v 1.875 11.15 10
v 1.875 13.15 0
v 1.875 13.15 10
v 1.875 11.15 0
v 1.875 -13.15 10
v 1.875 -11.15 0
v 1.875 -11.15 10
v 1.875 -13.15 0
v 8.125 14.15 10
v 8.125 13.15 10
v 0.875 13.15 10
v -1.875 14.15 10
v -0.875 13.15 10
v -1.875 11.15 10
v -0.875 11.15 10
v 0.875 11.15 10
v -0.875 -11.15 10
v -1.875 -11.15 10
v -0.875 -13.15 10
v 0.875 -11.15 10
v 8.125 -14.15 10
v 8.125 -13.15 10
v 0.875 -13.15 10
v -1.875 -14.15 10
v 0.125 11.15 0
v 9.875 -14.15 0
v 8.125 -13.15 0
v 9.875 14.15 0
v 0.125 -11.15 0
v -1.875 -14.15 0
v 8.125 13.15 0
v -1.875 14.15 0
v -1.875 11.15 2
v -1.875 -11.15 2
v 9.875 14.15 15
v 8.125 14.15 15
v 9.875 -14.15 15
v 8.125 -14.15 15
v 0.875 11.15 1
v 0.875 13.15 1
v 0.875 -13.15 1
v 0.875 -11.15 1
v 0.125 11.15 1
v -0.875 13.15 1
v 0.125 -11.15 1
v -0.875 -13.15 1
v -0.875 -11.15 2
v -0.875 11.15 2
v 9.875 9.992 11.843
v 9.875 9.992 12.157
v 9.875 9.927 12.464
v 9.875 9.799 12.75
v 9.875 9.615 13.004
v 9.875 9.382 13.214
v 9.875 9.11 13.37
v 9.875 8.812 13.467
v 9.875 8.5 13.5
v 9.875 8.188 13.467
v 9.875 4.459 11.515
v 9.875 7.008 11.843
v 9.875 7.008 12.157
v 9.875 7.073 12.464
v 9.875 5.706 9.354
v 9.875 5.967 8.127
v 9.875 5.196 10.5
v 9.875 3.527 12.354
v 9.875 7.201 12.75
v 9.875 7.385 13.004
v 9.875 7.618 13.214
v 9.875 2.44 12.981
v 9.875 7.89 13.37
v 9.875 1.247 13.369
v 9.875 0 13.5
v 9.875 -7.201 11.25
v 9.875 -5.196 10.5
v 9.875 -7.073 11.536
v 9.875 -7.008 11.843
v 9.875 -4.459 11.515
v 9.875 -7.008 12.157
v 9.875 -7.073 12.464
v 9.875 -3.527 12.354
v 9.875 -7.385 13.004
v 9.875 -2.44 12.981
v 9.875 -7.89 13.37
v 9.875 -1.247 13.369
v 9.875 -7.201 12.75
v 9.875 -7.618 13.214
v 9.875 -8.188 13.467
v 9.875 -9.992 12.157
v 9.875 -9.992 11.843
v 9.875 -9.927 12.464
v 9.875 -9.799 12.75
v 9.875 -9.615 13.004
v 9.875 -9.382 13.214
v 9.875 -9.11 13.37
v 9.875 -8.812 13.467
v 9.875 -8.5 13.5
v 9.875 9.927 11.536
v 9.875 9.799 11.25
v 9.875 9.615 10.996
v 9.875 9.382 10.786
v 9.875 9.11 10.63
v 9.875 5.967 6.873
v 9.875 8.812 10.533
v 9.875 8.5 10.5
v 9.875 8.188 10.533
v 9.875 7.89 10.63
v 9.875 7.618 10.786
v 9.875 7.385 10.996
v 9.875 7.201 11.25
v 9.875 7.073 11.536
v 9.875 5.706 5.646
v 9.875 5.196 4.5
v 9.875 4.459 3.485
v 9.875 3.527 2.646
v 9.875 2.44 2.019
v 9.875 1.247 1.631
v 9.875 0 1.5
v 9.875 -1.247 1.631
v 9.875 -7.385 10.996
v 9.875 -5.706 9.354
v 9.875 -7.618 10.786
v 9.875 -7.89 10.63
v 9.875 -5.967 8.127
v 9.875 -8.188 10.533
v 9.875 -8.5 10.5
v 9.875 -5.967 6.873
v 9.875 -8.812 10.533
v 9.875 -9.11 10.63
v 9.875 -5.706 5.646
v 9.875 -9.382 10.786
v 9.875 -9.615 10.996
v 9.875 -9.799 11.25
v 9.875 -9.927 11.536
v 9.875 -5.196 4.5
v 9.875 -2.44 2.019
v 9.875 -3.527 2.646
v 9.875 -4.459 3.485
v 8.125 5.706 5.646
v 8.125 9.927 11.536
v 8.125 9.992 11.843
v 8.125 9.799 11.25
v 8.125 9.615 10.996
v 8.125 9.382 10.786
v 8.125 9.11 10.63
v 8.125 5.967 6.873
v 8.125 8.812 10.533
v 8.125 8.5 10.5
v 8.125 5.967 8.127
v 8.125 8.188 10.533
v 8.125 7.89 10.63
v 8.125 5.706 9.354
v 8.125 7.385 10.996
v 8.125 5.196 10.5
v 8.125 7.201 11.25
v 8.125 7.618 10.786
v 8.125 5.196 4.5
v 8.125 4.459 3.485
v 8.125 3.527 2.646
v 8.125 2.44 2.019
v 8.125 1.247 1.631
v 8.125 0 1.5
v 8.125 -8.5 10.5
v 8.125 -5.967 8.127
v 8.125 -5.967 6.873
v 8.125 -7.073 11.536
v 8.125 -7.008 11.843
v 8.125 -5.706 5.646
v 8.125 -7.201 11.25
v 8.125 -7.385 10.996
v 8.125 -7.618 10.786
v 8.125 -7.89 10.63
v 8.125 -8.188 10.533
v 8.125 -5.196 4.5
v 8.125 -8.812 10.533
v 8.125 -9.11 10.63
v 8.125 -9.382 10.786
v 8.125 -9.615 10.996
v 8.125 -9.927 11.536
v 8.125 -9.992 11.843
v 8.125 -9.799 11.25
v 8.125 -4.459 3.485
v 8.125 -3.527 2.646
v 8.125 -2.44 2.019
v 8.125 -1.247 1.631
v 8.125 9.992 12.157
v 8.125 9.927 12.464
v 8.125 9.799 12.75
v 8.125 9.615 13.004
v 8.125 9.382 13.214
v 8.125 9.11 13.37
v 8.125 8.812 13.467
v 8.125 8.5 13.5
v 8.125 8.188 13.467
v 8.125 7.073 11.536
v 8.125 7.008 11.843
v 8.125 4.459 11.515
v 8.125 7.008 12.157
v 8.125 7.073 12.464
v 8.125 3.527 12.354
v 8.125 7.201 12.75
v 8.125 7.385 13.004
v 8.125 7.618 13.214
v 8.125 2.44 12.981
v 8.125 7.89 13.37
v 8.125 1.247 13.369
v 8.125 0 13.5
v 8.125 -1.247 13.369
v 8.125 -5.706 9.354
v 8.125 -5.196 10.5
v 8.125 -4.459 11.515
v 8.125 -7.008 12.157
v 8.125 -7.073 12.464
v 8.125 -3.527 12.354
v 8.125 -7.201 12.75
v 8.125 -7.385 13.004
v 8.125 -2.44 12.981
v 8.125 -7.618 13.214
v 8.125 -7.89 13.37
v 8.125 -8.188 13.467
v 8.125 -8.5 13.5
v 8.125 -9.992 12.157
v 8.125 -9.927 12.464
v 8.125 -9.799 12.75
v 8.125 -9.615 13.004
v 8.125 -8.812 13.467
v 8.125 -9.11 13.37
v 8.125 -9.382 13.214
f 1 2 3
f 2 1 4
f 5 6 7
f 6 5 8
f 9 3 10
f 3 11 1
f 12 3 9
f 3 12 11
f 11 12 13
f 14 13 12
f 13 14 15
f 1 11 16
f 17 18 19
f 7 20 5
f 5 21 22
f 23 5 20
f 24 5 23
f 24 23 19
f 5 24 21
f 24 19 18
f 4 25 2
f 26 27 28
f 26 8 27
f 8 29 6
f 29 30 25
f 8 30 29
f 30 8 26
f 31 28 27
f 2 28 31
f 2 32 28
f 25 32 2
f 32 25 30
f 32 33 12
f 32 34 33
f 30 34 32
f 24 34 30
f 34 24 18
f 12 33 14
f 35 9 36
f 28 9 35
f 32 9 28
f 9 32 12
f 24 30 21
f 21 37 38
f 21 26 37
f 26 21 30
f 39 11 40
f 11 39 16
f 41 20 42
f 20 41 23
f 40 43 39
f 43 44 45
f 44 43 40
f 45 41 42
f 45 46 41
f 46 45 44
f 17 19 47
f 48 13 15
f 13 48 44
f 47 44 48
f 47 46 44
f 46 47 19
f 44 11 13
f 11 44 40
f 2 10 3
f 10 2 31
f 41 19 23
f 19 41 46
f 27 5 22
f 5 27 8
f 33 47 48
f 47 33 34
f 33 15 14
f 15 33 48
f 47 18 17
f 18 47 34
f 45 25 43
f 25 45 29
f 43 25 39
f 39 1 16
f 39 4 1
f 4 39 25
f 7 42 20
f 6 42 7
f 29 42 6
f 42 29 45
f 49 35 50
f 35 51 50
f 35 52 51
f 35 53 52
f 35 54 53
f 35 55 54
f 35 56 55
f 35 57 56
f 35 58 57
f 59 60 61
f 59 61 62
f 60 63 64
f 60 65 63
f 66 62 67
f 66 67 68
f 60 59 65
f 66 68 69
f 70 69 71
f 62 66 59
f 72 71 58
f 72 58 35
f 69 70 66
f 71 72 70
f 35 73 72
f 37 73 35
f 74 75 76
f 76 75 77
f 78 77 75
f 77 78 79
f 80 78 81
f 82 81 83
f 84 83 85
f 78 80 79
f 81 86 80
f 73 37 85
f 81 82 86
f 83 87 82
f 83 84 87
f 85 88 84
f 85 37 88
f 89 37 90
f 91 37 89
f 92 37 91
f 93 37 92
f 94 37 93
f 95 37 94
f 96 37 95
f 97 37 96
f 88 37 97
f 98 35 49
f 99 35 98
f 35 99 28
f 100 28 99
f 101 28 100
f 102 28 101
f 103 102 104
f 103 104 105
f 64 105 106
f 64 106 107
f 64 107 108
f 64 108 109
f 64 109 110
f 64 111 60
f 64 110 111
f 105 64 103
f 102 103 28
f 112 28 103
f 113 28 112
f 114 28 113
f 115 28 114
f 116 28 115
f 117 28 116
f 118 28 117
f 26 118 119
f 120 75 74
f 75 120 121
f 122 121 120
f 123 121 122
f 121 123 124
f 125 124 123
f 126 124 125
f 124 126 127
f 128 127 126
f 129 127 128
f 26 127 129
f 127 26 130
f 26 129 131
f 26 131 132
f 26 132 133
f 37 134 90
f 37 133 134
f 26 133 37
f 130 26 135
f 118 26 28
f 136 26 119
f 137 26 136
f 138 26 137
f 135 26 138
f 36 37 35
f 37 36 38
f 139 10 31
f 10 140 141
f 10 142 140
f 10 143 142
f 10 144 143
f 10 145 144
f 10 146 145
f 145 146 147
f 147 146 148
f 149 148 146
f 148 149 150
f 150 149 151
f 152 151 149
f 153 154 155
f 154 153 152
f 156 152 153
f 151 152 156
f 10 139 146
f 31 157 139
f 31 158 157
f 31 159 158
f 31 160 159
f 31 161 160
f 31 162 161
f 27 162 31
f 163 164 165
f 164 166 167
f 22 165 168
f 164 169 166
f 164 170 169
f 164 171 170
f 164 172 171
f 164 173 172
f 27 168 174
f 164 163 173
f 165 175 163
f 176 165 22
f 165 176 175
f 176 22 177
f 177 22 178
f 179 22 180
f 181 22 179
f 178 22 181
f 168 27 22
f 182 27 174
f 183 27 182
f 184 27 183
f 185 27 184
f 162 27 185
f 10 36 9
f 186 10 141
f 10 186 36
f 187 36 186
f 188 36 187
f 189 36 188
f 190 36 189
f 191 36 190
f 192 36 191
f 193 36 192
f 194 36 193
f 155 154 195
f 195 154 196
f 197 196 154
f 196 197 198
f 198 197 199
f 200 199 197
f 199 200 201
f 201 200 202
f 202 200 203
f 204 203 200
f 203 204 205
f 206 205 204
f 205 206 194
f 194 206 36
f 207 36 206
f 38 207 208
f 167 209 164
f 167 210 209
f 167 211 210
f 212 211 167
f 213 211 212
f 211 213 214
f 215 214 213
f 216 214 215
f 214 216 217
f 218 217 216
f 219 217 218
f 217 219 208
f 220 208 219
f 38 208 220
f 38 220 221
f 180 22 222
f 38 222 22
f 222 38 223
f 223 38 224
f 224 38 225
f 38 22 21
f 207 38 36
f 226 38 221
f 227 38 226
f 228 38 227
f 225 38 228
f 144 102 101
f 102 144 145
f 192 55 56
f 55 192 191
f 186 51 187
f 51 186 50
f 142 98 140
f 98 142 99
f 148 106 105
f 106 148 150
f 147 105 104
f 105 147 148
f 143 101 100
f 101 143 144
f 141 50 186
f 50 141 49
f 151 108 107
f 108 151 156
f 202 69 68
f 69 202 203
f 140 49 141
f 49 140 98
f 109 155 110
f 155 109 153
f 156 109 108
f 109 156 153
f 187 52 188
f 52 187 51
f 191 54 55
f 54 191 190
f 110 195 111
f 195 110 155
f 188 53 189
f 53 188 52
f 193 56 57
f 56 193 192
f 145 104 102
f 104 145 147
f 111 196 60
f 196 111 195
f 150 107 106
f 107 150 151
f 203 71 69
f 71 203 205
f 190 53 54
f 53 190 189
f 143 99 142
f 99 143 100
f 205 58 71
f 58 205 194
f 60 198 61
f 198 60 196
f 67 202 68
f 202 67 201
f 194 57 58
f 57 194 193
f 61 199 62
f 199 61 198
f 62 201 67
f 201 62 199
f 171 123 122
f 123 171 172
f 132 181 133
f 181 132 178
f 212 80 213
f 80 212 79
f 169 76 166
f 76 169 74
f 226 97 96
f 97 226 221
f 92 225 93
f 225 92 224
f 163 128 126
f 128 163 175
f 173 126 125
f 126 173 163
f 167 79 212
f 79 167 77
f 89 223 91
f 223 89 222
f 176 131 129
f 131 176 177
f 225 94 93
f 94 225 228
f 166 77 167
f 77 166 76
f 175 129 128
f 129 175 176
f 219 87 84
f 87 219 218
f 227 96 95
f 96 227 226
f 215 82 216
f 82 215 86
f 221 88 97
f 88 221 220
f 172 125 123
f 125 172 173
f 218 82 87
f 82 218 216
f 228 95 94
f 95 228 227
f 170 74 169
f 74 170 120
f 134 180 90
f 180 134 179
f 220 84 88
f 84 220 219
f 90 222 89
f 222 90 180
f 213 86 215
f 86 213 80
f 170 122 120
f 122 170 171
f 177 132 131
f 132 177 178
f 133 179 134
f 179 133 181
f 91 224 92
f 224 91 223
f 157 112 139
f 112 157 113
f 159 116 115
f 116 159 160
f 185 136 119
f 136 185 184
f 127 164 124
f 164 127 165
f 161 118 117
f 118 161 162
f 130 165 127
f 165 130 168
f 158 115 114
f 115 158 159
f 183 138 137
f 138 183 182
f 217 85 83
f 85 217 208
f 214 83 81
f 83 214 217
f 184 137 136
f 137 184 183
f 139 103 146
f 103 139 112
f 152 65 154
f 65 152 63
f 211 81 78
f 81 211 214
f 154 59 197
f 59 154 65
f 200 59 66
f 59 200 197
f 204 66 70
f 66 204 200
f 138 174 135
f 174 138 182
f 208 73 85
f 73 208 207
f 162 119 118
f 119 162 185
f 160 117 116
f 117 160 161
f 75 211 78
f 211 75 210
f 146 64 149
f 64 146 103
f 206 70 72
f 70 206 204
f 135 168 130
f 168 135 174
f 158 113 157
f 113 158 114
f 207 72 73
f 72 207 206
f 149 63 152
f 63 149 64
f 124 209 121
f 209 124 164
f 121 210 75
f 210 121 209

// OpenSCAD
//prefixes:
//d_ distance
//r_ radius
//h_ height
//w_ width
//l_ length
//m_ margin
//o_ offset

/*

module screw_hole(d_screwhole,r_screwhole,m_screwhole,h_plate,w_plate,l_plate,length,q){

    r_screwhole_perim = r_screwhole+m_screwhole;

    difference(){
    
   union(){       
                 translate([0,0,h_plate/2])
      cube([d_screwhole*2,r_screwhole_perim*2,h_plate],center=true);

        translate([-d_screwhole,0,0]){   
          difference(){
            cylinder(r=r_screwhole_perim,h_plate);
         //   cylinder(r=r_screwhole,h_plate);
          }
        }   
        
        translate([d_screwhole,0,0]){   
          difference(){
            cylinder(r=r_screwhole_perim,h_plate);
         //   cylinder(r=r_screwhole,h_plate);
          }
        }   
   }
   
           translate([-d_screwhole,0,0]){   
          difference(){
         //   cylinder(r=r_screwhole_perim,h_plate);
            cylinder(r=r_screwhole,h_plate);
          }
        }   
        
        translate([d_screwhole,0,0]){   
          difference(){
          //  cylinder(r=r_screwhole_perim,h_plate);
            cylinder(r=r_screwhole,h_plate);
          }
        }  
   }
}

module hole_pattern(o_hole_pattern,r_hole_pattern,h_hole_pattern,xnum,ynum,q){
       
$fn=q;
 
 for (xpos=[1:xnum], ypos = [1:ynum]) // do twelve iterations, using each xpos with each ypos
   translate([xpos*o_hole_pattern, ypos*o_hole_pattern, 0]) #cylinder(r=r_hole_pattern,h=h_hole_pattern);

}

module plate(d_screwhole,r_screwhole,m_screwhole,h_plate,w_plate,l_plate,length,q){
    
$fn=q;

    r_screwhole_perim = r_screwhole+m_screwhole;
    o_front_screws=(l_plate/2)+r_screwhole_perim;
    
    back_screw_offset=-(l_plate/2)+4+(r_screwhole/2);
    front_screw_offset=back_screw_offset+24.5;

difference(){  

union(){ 
  translate([0,36,h_plate/2])
        cube([w_plate,l_plate,h_plate],center=true);
      
  translate([0,o_front_screws-21,0]) 
    screw_hole(d_screwhole,r_screwhole,m_screwhole,h_plate,w_plate,l_plate,length,q);
    } 
    
      translate([0,front_screw_offset,0])
         #cylinder(r=r_screwhole,h_plate);
    
       translate([0,back_screw_offset,0])
         #cylinder(r=r_screwhole,h_plate);

      o_hole_pattern=10;
    r_hole_pattern=4;
    xnum=2;
    ynum=12;
    
    translate([-8,-25,0])
        hole_pattern(o_hole_pattern,r_hole_pattern,r_hole_pattern,xnum,ynum,q);
    
    translate([-24,-25,0])
        hole_pattern(o_hole_pattern,r_hole_pattern,r_hole_pattern,1,ynum,q);

}

}


module servo_mount(r_hole,o_hole_1,o_hole_2,q){  
    $fn=q;
    
    h_riser=0;
    
    h_servo_mount=18;
    
    l_servo_mount=7.25;
    w_servo_mount=3;
    
    l_servo=41;
    
    o_side=7;
    
    module servo_mount(){  
      
        w_cylinder=w_servo_mount*2;
        
        difference(){
            translate([0,0,h_servo_mount/2])   
                cube([l_servo_mount,w_servo_mount,h_servo_mount],center=true);
            
             translate([0,-(w_cylinder/2),o_hole_1+h_riser])  
                rotate([0,90,90])
                    cylinder(r=r_hole,w_cylinder);
            
            
            translate([0,-(w_cylinder/2),o_hole_2+h_riser])  
                rotate([0,90,90])
                    cylinder(r=r_hole,w_cylinder);
            
            }
    } 

    oy_servo_mount=13.5 - o_side;
    ox_servo_mount=l_servo_mount + l_servo + 0.5 ;
    
    translate([-24.75,oy_servo_mount,0]){
        servo_mount();
    
        translate([ox_servo_mount,0,0])
            servo_mount();
    }
    
    
    
//translate([0,-1,-1/2]) 
 //   #cube([59,45,1],center=true);
    
    
translate([-0.5,1.5,h_riser/2]) 
    cube([41,33,h_riser],center=true);


h_stabiliser=h_servo_mount/2;

translate([-7,19.5,h_stabiliser/2])   
       cube([l_servo_mount,w_servo_mount,h_stabiliser],center=true);

h_servo_mount_2 =14;

translate([20-10,-(16.5 + 6),0]) {   

difference(){
    
   translate([0,0,h_servo_mount_2/2]) 
    cube([l_servo_mount,2,h_servo_mount_2],center=true);
            
translate([0,-1.5,h_riser+10.5])  
    rotate([0,90,90])
        cylinder(r=r_hole,3);
    
}
}


    
}

//test 1 
//plate(d_screwhole=30,r_screwhole=4.5,h_plate=3,w_plate=50,l_plate=10,q=60);

//test 2
//plate(d_screwhole=30,r_screwhole=4.5/2,h_plate=2,w_plate=50,l_plate=10,q=60);

//test 3
q=75;

//plate(d_screwhole=30,r_screwhole=4.1/2,m_screwhole=2,h_plate=2,w_plate=17,l_plate=80,q=q);

//servo mount test 1
//$fn=100;


//integration test 1

plate(d_screwhole=30,r_screwhole=4.1/2,m_screwhole=2,h_plate=2,w_plate=47,l_plate=110,q=q);

translate([0,56+7 ,2])  
    rotate([0,0,90])
servo_mount(r_hole=4.5/2,o_hole_1=5,o_hole_2=14.5,q=q);
*/

//integration test 3

$fn=30;

w_module = 26.3;
h_module=10;

d_module = 1.75;

o_mount = 2;

clearance_module=2*2;

h_mount=15;
w_mount=20;

d_mount=9;

O_screwhole_side=17/2;
r_screwhole=1.5;

d_screwholes=6;

module solids(){
      cube([d_module+o_mount,w_module+o_mount,h_module],center=true);
}


translate([0,0,h_module/2])
difference(){
    
  solids();
    
    translate([0,0,o_mount/2])
        cube([d_module,w_module,h_module],center=true);
    
    
   translate([-1,0,1+ o_mount/2])
        cube([d_module,w_module-clearance_module,h_module],center=true);
    
    
    translate([o_mount/2,0,0])
        cube([d_module,w_module -clearance_module,h_module],center=true);
    
}

difference(){

union(){
translate([d_mount,0,h_mount/2])
    cube([d_module,w_module+o_mount,h_mount],center=true);

translate([3.5,0.5+ w_module/2,h_module/2])
    cube([10,o_mount/2,h_module],center=true);

translate([3.5,-(0.5+ w_module/2),h_module/2])
    cube([10,o_mount/2,h_module],center=true);
}


 translate([d_screwholes,O_screwhole_side,12])  
    rotate([0,90,0])
        cylinder(r=r_screwhole,h=5);

 translate([d_screwholes,-O_screwhole_side,12])  
    rotate([0,90,0])
        cylinder(r=r_screwhole,h=5);

 translate([d_screwholes,0,7.5])  
    rotate([0,90,0])
        cylinder(r=6,h=5);


}
